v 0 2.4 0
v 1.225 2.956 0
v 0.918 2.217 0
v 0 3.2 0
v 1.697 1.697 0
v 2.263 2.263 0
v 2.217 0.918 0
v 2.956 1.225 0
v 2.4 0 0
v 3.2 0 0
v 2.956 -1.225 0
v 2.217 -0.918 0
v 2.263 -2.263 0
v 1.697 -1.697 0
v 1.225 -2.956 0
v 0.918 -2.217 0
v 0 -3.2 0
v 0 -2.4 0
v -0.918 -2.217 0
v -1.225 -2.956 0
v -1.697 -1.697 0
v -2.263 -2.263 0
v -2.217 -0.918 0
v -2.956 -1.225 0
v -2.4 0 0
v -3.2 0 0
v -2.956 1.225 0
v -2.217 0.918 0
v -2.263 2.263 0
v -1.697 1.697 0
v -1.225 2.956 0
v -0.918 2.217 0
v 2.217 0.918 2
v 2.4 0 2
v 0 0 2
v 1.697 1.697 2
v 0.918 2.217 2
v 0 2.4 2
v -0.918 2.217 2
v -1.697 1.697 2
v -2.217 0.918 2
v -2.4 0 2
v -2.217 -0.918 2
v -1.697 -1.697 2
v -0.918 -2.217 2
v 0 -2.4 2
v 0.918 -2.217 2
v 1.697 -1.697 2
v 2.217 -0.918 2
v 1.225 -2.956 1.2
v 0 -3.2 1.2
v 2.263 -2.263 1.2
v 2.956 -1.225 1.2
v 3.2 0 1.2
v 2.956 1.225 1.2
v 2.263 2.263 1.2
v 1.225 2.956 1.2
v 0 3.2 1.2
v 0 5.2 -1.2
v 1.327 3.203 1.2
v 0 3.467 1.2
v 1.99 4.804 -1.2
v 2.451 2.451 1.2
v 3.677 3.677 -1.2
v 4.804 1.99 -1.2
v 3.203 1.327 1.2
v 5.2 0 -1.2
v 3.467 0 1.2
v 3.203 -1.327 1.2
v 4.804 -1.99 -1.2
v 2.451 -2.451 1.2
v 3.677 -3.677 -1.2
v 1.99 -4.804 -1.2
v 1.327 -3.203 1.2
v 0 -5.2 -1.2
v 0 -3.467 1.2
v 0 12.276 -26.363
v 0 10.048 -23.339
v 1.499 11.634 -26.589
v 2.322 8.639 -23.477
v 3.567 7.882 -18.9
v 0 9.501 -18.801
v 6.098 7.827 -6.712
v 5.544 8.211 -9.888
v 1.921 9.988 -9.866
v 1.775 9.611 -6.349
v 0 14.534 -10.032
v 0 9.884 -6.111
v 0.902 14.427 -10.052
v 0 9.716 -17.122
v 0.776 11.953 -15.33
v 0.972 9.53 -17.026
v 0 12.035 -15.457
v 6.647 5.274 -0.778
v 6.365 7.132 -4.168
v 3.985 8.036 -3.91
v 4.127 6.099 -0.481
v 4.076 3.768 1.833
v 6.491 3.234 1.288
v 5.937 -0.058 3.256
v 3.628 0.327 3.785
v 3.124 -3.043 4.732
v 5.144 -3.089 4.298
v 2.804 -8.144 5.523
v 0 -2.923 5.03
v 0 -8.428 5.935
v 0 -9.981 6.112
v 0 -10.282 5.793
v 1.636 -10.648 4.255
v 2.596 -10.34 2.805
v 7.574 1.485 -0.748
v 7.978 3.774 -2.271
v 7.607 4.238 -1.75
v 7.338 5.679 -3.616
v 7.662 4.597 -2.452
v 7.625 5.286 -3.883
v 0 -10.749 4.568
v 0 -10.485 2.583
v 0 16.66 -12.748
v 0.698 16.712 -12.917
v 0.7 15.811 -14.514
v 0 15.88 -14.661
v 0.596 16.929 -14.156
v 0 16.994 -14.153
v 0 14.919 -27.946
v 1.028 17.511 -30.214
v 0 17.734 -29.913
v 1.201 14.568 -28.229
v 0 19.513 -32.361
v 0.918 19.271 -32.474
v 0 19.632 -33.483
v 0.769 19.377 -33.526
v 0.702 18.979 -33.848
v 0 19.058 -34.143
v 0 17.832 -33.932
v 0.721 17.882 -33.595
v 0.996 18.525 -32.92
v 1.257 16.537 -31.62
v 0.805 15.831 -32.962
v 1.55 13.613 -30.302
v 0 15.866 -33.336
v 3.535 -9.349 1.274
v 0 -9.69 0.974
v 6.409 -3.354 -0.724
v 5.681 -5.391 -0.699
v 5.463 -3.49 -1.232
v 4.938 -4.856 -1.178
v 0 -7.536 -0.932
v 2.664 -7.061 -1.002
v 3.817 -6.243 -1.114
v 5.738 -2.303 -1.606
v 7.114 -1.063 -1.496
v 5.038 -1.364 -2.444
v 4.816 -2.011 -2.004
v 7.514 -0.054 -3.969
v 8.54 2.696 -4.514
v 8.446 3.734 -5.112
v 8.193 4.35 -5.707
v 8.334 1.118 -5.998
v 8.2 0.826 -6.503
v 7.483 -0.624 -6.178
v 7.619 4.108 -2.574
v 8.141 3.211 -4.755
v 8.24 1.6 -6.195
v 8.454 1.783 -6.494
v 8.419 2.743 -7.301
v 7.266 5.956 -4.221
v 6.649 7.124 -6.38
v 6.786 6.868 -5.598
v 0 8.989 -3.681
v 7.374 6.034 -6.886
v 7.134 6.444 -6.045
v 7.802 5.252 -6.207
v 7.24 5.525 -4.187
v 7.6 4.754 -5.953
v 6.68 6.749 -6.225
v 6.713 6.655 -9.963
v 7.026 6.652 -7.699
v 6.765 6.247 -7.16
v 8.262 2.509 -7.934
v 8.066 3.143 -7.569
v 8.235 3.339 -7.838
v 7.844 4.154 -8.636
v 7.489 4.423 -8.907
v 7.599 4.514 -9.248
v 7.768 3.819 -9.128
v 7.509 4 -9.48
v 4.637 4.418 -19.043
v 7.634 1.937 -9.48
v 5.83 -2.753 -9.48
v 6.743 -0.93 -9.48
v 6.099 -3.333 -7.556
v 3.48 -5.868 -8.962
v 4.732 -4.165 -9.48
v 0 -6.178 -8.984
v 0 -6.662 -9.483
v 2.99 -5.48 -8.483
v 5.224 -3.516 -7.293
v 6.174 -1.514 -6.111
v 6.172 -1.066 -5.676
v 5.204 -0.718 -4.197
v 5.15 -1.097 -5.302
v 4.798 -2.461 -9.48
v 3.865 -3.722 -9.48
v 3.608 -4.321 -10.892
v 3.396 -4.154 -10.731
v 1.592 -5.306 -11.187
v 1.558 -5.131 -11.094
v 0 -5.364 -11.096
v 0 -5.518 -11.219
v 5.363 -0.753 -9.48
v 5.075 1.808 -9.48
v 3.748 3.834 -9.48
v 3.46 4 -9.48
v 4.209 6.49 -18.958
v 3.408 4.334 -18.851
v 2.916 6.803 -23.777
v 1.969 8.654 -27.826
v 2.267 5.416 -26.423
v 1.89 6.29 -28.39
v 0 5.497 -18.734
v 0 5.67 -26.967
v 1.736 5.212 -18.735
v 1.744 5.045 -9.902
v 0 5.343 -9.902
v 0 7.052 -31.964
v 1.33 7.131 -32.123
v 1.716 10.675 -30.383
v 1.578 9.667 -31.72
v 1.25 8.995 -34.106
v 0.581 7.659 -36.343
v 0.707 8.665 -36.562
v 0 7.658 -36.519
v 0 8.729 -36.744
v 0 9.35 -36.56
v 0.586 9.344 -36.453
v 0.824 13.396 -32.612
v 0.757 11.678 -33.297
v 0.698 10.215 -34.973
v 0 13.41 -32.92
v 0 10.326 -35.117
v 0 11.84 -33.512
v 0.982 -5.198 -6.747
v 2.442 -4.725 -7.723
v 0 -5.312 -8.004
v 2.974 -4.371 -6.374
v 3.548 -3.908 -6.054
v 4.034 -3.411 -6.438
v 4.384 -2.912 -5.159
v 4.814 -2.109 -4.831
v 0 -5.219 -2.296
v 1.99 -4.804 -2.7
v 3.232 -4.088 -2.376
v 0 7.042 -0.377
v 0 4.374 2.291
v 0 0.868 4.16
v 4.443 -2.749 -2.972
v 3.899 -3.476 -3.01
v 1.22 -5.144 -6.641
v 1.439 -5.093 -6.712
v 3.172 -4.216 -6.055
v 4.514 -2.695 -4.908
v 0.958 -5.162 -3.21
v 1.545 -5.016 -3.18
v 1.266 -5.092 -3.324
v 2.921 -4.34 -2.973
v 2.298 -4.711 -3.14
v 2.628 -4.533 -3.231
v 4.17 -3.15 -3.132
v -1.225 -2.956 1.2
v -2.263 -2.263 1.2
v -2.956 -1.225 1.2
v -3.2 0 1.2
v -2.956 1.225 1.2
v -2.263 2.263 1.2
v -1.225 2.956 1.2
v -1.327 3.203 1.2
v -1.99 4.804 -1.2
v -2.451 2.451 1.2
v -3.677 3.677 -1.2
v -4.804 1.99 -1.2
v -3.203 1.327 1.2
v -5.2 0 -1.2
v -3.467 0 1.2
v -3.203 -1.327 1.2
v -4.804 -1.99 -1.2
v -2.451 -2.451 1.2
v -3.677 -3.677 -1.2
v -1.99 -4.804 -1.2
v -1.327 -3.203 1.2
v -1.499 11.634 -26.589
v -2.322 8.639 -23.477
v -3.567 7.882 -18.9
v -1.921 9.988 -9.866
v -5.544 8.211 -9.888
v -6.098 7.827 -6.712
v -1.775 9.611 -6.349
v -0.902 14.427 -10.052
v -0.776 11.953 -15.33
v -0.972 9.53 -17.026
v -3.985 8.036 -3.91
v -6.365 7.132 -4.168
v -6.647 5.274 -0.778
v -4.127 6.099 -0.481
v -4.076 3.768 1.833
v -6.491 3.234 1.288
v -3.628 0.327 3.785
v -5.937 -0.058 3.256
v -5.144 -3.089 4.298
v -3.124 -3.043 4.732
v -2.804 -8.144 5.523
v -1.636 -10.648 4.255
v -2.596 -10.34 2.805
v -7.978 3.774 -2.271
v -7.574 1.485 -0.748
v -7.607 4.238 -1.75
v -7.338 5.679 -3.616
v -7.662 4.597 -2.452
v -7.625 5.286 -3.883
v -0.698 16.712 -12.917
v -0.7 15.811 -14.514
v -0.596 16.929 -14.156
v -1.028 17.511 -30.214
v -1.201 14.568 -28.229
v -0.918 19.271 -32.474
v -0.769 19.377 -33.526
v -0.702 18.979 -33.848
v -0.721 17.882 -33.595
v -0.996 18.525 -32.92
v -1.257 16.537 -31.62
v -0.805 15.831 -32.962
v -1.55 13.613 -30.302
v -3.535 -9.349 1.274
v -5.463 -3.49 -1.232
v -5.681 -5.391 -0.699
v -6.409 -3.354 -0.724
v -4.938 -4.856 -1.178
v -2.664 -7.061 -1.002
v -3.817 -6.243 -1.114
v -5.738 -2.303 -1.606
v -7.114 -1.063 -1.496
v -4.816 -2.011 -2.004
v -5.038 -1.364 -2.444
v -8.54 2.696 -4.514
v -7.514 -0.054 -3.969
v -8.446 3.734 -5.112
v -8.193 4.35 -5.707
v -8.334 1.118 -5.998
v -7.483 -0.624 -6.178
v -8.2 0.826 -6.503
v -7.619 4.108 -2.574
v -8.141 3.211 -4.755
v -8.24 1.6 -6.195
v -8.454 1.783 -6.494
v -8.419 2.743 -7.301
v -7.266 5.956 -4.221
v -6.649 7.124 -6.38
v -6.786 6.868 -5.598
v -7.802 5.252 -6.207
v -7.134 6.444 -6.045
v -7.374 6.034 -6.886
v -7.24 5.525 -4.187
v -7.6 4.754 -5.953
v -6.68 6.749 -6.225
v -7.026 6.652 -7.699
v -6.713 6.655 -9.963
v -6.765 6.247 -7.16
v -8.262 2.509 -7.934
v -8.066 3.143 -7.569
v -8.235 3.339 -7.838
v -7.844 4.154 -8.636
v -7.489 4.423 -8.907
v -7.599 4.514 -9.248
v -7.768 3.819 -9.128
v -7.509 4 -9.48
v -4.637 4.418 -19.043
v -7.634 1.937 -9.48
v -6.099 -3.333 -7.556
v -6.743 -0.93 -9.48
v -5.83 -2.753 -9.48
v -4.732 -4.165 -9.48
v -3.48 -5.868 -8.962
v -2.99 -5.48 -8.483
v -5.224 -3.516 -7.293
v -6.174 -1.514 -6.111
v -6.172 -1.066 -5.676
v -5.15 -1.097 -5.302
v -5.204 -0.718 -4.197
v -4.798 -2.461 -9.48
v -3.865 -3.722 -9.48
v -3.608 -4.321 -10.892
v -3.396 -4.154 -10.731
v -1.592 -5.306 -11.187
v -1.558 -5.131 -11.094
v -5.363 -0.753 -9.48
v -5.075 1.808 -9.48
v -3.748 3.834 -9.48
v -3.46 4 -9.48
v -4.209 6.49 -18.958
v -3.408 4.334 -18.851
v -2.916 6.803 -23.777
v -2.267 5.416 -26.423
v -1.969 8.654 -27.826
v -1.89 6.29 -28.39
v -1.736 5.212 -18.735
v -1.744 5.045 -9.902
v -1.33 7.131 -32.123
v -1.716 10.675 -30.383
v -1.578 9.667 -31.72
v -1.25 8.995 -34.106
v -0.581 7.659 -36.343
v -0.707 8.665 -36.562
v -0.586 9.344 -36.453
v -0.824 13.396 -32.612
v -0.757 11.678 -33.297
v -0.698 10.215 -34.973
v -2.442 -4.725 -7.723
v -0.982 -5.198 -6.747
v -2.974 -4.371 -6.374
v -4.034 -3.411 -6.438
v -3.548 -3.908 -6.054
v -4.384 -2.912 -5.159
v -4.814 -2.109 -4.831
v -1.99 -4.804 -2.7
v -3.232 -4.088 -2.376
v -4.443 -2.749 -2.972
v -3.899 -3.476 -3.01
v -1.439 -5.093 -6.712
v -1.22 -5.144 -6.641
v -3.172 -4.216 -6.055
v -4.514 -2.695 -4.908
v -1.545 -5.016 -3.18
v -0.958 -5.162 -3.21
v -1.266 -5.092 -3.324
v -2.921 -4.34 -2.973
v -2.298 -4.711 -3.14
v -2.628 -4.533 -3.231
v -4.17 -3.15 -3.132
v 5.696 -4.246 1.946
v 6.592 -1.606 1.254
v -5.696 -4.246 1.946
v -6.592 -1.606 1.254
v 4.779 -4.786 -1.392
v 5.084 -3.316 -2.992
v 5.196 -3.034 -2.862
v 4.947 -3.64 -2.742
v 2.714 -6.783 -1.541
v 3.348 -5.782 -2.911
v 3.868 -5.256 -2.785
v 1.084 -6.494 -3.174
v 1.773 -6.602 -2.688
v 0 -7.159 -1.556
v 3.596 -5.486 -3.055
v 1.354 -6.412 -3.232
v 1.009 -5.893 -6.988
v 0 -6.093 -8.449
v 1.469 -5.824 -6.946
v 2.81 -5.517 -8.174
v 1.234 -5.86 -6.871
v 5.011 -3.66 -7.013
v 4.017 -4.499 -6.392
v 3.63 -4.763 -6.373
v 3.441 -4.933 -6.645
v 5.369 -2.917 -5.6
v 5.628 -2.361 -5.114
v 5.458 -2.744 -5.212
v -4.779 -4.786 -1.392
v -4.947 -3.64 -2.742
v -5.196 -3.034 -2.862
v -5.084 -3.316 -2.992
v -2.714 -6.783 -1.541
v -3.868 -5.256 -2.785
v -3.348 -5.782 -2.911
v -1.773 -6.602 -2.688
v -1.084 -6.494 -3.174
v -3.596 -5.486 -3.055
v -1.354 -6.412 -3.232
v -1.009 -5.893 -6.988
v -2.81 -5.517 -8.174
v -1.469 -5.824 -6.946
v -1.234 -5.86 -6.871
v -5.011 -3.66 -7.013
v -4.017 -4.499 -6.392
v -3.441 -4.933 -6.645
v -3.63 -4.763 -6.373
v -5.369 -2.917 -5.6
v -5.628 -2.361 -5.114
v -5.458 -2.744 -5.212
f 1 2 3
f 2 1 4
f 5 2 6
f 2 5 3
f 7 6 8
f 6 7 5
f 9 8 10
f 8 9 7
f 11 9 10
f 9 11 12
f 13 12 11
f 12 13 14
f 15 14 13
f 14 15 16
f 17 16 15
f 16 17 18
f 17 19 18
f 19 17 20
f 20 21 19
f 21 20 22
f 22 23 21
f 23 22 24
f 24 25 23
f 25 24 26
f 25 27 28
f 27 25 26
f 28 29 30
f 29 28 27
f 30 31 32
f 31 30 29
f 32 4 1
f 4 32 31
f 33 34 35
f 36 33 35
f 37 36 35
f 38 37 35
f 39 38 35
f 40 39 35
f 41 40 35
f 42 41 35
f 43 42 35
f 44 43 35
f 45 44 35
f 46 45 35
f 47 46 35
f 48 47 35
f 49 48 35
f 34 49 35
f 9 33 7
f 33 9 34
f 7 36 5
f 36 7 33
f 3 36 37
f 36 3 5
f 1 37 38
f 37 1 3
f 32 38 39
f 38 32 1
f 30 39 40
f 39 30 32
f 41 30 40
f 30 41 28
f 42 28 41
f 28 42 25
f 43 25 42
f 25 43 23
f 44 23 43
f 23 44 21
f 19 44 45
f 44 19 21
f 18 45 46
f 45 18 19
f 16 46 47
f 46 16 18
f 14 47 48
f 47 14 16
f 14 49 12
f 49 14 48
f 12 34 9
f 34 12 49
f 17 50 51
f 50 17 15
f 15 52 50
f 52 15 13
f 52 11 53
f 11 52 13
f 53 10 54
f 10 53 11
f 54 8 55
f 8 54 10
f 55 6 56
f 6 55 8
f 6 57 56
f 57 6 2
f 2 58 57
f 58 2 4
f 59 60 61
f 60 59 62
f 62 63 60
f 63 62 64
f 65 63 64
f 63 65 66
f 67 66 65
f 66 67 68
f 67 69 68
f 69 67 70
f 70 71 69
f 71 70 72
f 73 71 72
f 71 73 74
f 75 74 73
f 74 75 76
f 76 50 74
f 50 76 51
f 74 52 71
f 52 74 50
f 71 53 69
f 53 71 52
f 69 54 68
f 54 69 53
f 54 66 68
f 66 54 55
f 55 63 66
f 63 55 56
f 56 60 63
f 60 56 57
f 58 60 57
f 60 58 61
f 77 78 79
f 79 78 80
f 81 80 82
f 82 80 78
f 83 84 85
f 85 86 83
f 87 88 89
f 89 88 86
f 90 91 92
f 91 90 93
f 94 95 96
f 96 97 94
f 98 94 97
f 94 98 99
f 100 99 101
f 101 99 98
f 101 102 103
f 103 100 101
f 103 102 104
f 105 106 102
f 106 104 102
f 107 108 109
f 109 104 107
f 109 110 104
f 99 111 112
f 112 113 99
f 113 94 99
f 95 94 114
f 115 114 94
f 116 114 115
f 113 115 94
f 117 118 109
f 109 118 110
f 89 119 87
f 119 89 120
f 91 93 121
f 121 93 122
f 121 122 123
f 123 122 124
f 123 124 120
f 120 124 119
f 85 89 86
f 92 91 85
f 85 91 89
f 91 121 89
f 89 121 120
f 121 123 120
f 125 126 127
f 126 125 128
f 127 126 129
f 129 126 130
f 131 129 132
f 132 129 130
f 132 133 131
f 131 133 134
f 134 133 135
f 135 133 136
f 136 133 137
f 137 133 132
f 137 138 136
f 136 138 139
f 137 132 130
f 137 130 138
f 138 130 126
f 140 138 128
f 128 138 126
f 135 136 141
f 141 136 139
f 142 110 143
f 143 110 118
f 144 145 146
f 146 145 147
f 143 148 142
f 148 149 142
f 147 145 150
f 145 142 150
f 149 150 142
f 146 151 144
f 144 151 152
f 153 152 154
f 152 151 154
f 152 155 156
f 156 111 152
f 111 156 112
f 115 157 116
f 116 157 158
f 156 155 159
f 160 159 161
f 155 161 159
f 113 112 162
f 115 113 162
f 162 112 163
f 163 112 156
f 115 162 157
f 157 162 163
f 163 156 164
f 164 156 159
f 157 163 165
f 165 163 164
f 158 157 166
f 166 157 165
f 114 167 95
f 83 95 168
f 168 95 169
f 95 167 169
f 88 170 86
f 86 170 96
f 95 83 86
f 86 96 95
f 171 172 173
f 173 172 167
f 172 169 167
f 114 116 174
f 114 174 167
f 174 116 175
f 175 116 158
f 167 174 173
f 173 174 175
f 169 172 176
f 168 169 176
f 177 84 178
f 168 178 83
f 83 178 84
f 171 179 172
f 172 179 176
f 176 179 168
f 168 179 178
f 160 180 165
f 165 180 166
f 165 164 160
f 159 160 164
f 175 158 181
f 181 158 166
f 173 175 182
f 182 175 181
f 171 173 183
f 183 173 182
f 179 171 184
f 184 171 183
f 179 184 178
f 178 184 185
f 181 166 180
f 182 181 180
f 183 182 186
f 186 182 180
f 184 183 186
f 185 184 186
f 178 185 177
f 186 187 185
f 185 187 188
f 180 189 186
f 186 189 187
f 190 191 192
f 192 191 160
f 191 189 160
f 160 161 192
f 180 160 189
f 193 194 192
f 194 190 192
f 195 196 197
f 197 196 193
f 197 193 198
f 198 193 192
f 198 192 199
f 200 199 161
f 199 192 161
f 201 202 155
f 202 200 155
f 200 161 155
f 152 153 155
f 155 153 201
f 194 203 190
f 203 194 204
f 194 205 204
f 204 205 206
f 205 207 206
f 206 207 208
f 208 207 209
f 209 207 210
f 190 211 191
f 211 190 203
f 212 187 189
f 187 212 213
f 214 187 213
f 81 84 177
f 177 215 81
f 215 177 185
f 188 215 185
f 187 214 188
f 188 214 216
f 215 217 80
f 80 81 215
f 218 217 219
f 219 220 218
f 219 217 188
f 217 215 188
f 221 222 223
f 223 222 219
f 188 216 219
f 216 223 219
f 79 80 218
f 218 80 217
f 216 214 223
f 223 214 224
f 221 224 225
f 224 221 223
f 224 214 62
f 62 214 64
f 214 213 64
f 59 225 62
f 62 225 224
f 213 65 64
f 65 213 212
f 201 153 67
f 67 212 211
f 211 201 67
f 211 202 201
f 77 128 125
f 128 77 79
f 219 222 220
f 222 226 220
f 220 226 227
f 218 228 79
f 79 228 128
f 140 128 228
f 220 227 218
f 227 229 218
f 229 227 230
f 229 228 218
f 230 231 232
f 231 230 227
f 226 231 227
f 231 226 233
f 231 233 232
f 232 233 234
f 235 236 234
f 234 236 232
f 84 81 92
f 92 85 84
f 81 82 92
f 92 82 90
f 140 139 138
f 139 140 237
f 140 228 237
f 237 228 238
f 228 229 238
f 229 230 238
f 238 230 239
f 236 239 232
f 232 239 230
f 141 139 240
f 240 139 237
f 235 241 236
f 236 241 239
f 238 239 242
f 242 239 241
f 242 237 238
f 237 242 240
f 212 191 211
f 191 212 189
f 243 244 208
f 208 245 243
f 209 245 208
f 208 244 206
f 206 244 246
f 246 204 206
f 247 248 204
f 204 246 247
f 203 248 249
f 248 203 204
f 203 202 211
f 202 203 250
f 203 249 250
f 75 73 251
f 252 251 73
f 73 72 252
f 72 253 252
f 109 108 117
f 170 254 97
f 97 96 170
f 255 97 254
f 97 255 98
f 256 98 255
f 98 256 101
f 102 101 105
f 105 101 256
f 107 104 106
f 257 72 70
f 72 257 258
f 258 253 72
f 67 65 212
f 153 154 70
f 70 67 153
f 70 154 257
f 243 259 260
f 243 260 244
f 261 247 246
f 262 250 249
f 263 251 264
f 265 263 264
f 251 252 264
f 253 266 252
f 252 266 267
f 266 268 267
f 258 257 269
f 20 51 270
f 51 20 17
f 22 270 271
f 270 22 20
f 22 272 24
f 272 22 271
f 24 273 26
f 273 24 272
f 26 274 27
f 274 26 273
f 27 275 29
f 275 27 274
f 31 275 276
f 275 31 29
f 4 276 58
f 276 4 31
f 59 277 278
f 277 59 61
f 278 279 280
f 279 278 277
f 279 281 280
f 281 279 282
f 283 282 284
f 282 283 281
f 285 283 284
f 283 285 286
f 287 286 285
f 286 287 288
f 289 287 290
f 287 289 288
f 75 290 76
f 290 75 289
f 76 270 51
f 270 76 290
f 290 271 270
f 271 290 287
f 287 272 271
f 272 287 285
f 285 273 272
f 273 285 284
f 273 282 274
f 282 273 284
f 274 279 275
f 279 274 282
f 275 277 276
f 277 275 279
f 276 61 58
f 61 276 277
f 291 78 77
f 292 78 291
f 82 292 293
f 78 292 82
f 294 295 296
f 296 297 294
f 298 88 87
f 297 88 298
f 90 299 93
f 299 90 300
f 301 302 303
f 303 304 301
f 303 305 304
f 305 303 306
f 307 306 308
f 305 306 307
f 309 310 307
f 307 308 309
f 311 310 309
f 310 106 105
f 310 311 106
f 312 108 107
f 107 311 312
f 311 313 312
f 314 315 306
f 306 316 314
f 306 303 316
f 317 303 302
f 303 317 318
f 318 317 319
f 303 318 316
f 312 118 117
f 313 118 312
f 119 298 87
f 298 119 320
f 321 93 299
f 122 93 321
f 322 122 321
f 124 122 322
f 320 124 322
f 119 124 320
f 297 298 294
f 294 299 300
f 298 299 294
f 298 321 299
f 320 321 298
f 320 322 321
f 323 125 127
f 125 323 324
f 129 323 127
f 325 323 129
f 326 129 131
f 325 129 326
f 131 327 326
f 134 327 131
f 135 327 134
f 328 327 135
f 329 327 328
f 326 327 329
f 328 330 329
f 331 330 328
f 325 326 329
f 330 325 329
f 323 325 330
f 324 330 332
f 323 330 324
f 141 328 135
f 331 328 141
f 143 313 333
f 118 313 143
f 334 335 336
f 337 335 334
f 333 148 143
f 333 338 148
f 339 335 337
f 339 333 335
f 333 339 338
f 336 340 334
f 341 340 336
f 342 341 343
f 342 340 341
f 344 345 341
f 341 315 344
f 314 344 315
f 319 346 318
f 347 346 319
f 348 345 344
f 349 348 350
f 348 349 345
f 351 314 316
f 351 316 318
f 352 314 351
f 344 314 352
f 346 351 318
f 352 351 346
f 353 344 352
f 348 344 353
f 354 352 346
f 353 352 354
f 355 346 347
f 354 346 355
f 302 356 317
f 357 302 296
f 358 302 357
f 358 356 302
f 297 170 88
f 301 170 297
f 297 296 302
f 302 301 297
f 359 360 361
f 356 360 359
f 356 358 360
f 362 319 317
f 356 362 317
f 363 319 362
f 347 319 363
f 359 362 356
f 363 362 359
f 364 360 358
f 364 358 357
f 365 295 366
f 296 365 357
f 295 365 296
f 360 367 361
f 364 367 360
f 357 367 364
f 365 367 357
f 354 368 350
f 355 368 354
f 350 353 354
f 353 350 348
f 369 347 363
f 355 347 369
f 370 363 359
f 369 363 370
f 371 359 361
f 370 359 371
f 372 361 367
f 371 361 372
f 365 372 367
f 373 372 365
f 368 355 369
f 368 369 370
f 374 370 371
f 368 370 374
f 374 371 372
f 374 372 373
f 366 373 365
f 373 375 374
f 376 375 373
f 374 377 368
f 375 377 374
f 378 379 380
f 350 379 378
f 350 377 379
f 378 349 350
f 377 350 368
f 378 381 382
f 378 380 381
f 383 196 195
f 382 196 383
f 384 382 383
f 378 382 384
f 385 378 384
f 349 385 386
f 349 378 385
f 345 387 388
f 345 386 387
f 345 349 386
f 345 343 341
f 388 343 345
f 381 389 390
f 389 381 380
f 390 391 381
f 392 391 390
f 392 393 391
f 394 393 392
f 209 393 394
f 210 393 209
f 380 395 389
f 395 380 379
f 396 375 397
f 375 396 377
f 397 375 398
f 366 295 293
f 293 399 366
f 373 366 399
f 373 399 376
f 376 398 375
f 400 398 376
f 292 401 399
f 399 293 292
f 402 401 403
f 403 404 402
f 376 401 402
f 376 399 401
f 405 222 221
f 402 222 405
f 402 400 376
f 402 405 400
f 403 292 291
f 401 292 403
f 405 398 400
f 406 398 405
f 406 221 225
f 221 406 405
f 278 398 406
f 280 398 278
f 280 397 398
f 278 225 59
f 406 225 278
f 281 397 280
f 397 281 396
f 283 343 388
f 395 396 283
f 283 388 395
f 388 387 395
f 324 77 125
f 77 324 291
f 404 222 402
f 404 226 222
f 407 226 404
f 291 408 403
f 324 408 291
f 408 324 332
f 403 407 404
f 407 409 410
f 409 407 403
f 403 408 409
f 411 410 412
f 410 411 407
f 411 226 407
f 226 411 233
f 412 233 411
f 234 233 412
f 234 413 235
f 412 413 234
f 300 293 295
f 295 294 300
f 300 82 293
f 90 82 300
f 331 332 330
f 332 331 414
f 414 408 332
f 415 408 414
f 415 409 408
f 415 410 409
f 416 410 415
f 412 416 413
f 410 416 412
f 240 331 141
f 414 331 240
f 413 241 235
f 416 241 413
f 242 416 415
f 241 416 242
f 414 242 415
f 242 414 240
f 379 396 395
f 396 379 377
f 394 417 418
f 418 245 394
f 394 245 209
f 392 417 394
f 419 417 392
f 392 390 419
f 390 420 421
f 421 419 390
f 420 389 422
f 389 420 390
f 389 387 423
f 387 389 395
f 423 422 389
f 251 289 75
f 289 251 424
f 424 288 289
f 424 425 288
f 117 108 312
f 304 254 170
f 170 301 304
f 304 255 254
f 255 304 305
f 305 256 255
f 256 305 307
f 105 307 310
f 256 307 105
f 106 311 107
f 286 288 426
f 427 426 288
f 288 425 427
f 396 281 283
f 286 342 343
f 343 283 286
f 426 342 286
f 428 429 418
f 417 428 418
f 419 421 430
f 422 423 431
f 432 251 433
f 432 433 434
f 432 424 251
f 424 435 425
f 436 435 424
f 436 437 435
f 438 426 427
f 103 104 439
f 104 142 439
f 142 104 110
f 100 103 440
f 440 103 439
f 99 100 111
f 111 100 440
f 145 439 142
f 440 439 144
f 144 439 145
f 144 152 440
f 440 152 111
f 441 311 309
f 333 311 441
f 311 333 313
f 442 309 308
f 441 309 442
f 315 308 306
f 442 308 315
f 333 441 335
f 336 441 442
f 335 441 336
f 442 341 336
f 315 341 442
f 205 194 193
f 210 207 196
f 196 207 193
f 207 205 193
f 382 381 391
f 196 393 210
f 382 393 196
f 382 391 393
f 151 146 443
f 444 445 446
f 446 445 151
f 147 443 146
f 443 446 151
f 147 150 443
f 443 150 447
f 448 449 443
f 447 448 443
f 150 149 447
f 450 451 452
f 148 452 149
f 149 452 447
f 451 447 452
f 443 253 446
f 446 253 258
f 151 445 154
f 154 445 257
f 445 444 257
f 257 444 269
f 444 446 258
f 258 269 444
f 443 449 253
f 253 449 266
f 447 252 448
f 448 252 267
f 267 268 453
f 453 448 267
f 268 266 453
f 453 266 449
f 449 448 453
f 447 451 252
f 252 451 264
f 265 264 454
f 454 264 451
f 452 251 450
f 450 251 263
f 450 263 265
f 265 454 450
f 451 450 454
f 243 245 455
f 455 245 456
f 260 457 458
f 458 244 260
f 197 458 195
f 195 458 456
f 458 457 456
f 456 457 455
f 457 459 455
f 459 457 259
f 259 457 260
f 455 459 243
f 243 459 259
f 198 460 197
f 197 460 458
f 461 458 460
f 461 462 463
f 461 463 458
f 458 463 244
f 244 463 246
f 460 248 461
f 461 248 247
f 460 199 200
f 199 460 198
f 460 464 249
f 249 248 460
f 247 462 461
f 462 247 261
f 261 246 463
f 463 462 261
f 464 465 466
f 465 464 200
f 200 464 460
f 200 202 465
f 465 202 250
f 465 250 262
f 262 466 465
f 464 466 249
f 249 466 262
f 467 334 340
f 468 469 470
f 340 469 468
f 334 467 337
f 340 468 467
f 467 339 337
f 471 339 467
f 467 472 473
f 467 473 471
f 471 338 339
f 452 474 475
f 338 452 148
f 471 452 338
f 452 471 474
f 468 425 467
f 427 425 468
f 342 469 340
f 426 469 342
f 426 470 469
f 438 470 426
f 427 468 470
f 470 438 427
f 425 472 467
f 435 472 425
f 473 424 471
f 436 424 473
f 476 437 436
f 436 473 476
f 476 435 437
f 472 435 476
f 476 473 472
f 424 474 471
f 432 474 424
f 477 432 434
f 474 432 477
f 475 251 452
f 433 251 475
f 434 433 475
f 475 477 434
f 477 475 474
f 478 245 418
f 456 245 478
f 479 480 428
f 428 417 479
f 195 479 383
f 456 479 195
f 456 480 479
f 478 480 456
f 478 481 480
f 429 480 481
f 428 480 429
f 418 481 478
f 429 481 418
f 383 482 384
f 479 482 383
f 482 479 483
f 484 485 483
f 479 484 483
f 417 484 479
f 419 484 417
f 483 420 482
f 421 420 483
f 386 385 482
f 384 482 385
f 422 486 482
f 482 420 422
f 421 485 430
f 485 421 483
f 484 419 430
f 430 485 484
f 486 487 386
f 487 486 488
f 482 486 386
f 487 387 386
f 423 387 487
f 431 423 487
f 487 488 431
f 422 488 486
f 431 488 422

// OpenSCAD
use <../lib.scad>
use <s/24076s01.scad>
use <s/24076s02.scad>
use <s/24076s03.scad>
use <s/24076s04.scad>
use <../p/stud4o.scad>
function ldraw_lib__24076() = [
// 0 Minifig Headdress Shark with Tail and Fin
// 0 Name: 24076.dat
// 0 Author: Philippe Hurbain [Philo]
// 0 !LDRAW_ORG Part UPDATE 2020-01
// 0 !LICENSE Licensed under CC BY 2.0 and CC BY 4.0 : see CAreadme.txt
// 
// 0 BFC CERTIFY CCW
  [0,"BFC","CERTIFY"],
  [0,"BFC","CCW"],
// 
// 0 !CATEGORY Minifig Headwear
// 
// 0 !HISTORY 2016-03-18 {LEGO Digital Designer} Original part shape
// 0 !HISTORY 2019-05-20 [Philo] File preparation for LDraw Parts Tracker
// 0 !HISTORY 2020-06-28 [PTadmin] Official Update 2020-01
// 
// 
// 1 16 0 -5 0 -1 0 0 0 -1.25 0 0 0 1 stud4o.dat
  [1,16,0,-5,0,-1,0,0,0,-1.25,0,0,0,1, ldraw_lib__stud4o()],
// 1 16 0 0 0 1 0 0 0 1 0 0 0 1 s\24076s01.dat
  [1,16,0,0,0,1,0,0,0,1,0,0,0,1, ldraw_lib__s__24076s01()],
// 1 16 0 0 0 -1 0 0 0 1 0 0 0 1 s\24076s01.dat
  [1,16,0,0,0,-1,0,0,0,1,0,0,0,1, ldraw_lib__s__24076s01()],
// 1 16 0 0 0 1 0 0 0 1 0 0 0 1 s\24076s02.dat
  [1,16,0,0,0,1,0,0,0,1,0,0,0,1, ldraw_lib__s__24076s02()],
// 1 16 0 0 0 -1 0 0 0 1 0 0 0 1 s\24076s02.dat
  [1,16,0,0,0,-1,0,0,0,1,0,0,0,1, ldraw_lib__s__24076s02()],
// 1 16 0 0 0 1 0 0 0 1 0 0 0 1 s\24076s03.dat
  [1,16,0,0,0,1,0,0,0,1,0,0,0,1, ldraw_lib__s__24076s03()],
// 1 16 0 0 0 -1 0 0 0 1 0 0 0 1 s\24076s03.dat
  [1,16,0,0,0,-1,0,0,0,1,0,0,0,1, ldraw_lib__s__24076s03()],
// 1 16 0 0 0 1 0 0 0 1 0 0 0 1 s\24076s04.dat
  [1,16,0,0,0,1,0,0,0,1,0,0,0,1, ldraw_lib__s__24076s04()],
// 1 16 0 0 0 -1 0 0 0 1 0 0 0 1 s\24076s04.dat
  [1,16,0,0,0,-1,0,0,0,1,0,0,0,1, ldraw_lib__s__24076s04()],
];
module ldraw_lib__24076(step=0, col=false, unit=2/5, alt=false, line=0.2, solid=!$preview)
    makepoly(ldraw_lib__24076(), step=step, col=col, unit=unit, alt=alt, line=line, solid=solid);
ldraw_lib__24076(line=0.2);
